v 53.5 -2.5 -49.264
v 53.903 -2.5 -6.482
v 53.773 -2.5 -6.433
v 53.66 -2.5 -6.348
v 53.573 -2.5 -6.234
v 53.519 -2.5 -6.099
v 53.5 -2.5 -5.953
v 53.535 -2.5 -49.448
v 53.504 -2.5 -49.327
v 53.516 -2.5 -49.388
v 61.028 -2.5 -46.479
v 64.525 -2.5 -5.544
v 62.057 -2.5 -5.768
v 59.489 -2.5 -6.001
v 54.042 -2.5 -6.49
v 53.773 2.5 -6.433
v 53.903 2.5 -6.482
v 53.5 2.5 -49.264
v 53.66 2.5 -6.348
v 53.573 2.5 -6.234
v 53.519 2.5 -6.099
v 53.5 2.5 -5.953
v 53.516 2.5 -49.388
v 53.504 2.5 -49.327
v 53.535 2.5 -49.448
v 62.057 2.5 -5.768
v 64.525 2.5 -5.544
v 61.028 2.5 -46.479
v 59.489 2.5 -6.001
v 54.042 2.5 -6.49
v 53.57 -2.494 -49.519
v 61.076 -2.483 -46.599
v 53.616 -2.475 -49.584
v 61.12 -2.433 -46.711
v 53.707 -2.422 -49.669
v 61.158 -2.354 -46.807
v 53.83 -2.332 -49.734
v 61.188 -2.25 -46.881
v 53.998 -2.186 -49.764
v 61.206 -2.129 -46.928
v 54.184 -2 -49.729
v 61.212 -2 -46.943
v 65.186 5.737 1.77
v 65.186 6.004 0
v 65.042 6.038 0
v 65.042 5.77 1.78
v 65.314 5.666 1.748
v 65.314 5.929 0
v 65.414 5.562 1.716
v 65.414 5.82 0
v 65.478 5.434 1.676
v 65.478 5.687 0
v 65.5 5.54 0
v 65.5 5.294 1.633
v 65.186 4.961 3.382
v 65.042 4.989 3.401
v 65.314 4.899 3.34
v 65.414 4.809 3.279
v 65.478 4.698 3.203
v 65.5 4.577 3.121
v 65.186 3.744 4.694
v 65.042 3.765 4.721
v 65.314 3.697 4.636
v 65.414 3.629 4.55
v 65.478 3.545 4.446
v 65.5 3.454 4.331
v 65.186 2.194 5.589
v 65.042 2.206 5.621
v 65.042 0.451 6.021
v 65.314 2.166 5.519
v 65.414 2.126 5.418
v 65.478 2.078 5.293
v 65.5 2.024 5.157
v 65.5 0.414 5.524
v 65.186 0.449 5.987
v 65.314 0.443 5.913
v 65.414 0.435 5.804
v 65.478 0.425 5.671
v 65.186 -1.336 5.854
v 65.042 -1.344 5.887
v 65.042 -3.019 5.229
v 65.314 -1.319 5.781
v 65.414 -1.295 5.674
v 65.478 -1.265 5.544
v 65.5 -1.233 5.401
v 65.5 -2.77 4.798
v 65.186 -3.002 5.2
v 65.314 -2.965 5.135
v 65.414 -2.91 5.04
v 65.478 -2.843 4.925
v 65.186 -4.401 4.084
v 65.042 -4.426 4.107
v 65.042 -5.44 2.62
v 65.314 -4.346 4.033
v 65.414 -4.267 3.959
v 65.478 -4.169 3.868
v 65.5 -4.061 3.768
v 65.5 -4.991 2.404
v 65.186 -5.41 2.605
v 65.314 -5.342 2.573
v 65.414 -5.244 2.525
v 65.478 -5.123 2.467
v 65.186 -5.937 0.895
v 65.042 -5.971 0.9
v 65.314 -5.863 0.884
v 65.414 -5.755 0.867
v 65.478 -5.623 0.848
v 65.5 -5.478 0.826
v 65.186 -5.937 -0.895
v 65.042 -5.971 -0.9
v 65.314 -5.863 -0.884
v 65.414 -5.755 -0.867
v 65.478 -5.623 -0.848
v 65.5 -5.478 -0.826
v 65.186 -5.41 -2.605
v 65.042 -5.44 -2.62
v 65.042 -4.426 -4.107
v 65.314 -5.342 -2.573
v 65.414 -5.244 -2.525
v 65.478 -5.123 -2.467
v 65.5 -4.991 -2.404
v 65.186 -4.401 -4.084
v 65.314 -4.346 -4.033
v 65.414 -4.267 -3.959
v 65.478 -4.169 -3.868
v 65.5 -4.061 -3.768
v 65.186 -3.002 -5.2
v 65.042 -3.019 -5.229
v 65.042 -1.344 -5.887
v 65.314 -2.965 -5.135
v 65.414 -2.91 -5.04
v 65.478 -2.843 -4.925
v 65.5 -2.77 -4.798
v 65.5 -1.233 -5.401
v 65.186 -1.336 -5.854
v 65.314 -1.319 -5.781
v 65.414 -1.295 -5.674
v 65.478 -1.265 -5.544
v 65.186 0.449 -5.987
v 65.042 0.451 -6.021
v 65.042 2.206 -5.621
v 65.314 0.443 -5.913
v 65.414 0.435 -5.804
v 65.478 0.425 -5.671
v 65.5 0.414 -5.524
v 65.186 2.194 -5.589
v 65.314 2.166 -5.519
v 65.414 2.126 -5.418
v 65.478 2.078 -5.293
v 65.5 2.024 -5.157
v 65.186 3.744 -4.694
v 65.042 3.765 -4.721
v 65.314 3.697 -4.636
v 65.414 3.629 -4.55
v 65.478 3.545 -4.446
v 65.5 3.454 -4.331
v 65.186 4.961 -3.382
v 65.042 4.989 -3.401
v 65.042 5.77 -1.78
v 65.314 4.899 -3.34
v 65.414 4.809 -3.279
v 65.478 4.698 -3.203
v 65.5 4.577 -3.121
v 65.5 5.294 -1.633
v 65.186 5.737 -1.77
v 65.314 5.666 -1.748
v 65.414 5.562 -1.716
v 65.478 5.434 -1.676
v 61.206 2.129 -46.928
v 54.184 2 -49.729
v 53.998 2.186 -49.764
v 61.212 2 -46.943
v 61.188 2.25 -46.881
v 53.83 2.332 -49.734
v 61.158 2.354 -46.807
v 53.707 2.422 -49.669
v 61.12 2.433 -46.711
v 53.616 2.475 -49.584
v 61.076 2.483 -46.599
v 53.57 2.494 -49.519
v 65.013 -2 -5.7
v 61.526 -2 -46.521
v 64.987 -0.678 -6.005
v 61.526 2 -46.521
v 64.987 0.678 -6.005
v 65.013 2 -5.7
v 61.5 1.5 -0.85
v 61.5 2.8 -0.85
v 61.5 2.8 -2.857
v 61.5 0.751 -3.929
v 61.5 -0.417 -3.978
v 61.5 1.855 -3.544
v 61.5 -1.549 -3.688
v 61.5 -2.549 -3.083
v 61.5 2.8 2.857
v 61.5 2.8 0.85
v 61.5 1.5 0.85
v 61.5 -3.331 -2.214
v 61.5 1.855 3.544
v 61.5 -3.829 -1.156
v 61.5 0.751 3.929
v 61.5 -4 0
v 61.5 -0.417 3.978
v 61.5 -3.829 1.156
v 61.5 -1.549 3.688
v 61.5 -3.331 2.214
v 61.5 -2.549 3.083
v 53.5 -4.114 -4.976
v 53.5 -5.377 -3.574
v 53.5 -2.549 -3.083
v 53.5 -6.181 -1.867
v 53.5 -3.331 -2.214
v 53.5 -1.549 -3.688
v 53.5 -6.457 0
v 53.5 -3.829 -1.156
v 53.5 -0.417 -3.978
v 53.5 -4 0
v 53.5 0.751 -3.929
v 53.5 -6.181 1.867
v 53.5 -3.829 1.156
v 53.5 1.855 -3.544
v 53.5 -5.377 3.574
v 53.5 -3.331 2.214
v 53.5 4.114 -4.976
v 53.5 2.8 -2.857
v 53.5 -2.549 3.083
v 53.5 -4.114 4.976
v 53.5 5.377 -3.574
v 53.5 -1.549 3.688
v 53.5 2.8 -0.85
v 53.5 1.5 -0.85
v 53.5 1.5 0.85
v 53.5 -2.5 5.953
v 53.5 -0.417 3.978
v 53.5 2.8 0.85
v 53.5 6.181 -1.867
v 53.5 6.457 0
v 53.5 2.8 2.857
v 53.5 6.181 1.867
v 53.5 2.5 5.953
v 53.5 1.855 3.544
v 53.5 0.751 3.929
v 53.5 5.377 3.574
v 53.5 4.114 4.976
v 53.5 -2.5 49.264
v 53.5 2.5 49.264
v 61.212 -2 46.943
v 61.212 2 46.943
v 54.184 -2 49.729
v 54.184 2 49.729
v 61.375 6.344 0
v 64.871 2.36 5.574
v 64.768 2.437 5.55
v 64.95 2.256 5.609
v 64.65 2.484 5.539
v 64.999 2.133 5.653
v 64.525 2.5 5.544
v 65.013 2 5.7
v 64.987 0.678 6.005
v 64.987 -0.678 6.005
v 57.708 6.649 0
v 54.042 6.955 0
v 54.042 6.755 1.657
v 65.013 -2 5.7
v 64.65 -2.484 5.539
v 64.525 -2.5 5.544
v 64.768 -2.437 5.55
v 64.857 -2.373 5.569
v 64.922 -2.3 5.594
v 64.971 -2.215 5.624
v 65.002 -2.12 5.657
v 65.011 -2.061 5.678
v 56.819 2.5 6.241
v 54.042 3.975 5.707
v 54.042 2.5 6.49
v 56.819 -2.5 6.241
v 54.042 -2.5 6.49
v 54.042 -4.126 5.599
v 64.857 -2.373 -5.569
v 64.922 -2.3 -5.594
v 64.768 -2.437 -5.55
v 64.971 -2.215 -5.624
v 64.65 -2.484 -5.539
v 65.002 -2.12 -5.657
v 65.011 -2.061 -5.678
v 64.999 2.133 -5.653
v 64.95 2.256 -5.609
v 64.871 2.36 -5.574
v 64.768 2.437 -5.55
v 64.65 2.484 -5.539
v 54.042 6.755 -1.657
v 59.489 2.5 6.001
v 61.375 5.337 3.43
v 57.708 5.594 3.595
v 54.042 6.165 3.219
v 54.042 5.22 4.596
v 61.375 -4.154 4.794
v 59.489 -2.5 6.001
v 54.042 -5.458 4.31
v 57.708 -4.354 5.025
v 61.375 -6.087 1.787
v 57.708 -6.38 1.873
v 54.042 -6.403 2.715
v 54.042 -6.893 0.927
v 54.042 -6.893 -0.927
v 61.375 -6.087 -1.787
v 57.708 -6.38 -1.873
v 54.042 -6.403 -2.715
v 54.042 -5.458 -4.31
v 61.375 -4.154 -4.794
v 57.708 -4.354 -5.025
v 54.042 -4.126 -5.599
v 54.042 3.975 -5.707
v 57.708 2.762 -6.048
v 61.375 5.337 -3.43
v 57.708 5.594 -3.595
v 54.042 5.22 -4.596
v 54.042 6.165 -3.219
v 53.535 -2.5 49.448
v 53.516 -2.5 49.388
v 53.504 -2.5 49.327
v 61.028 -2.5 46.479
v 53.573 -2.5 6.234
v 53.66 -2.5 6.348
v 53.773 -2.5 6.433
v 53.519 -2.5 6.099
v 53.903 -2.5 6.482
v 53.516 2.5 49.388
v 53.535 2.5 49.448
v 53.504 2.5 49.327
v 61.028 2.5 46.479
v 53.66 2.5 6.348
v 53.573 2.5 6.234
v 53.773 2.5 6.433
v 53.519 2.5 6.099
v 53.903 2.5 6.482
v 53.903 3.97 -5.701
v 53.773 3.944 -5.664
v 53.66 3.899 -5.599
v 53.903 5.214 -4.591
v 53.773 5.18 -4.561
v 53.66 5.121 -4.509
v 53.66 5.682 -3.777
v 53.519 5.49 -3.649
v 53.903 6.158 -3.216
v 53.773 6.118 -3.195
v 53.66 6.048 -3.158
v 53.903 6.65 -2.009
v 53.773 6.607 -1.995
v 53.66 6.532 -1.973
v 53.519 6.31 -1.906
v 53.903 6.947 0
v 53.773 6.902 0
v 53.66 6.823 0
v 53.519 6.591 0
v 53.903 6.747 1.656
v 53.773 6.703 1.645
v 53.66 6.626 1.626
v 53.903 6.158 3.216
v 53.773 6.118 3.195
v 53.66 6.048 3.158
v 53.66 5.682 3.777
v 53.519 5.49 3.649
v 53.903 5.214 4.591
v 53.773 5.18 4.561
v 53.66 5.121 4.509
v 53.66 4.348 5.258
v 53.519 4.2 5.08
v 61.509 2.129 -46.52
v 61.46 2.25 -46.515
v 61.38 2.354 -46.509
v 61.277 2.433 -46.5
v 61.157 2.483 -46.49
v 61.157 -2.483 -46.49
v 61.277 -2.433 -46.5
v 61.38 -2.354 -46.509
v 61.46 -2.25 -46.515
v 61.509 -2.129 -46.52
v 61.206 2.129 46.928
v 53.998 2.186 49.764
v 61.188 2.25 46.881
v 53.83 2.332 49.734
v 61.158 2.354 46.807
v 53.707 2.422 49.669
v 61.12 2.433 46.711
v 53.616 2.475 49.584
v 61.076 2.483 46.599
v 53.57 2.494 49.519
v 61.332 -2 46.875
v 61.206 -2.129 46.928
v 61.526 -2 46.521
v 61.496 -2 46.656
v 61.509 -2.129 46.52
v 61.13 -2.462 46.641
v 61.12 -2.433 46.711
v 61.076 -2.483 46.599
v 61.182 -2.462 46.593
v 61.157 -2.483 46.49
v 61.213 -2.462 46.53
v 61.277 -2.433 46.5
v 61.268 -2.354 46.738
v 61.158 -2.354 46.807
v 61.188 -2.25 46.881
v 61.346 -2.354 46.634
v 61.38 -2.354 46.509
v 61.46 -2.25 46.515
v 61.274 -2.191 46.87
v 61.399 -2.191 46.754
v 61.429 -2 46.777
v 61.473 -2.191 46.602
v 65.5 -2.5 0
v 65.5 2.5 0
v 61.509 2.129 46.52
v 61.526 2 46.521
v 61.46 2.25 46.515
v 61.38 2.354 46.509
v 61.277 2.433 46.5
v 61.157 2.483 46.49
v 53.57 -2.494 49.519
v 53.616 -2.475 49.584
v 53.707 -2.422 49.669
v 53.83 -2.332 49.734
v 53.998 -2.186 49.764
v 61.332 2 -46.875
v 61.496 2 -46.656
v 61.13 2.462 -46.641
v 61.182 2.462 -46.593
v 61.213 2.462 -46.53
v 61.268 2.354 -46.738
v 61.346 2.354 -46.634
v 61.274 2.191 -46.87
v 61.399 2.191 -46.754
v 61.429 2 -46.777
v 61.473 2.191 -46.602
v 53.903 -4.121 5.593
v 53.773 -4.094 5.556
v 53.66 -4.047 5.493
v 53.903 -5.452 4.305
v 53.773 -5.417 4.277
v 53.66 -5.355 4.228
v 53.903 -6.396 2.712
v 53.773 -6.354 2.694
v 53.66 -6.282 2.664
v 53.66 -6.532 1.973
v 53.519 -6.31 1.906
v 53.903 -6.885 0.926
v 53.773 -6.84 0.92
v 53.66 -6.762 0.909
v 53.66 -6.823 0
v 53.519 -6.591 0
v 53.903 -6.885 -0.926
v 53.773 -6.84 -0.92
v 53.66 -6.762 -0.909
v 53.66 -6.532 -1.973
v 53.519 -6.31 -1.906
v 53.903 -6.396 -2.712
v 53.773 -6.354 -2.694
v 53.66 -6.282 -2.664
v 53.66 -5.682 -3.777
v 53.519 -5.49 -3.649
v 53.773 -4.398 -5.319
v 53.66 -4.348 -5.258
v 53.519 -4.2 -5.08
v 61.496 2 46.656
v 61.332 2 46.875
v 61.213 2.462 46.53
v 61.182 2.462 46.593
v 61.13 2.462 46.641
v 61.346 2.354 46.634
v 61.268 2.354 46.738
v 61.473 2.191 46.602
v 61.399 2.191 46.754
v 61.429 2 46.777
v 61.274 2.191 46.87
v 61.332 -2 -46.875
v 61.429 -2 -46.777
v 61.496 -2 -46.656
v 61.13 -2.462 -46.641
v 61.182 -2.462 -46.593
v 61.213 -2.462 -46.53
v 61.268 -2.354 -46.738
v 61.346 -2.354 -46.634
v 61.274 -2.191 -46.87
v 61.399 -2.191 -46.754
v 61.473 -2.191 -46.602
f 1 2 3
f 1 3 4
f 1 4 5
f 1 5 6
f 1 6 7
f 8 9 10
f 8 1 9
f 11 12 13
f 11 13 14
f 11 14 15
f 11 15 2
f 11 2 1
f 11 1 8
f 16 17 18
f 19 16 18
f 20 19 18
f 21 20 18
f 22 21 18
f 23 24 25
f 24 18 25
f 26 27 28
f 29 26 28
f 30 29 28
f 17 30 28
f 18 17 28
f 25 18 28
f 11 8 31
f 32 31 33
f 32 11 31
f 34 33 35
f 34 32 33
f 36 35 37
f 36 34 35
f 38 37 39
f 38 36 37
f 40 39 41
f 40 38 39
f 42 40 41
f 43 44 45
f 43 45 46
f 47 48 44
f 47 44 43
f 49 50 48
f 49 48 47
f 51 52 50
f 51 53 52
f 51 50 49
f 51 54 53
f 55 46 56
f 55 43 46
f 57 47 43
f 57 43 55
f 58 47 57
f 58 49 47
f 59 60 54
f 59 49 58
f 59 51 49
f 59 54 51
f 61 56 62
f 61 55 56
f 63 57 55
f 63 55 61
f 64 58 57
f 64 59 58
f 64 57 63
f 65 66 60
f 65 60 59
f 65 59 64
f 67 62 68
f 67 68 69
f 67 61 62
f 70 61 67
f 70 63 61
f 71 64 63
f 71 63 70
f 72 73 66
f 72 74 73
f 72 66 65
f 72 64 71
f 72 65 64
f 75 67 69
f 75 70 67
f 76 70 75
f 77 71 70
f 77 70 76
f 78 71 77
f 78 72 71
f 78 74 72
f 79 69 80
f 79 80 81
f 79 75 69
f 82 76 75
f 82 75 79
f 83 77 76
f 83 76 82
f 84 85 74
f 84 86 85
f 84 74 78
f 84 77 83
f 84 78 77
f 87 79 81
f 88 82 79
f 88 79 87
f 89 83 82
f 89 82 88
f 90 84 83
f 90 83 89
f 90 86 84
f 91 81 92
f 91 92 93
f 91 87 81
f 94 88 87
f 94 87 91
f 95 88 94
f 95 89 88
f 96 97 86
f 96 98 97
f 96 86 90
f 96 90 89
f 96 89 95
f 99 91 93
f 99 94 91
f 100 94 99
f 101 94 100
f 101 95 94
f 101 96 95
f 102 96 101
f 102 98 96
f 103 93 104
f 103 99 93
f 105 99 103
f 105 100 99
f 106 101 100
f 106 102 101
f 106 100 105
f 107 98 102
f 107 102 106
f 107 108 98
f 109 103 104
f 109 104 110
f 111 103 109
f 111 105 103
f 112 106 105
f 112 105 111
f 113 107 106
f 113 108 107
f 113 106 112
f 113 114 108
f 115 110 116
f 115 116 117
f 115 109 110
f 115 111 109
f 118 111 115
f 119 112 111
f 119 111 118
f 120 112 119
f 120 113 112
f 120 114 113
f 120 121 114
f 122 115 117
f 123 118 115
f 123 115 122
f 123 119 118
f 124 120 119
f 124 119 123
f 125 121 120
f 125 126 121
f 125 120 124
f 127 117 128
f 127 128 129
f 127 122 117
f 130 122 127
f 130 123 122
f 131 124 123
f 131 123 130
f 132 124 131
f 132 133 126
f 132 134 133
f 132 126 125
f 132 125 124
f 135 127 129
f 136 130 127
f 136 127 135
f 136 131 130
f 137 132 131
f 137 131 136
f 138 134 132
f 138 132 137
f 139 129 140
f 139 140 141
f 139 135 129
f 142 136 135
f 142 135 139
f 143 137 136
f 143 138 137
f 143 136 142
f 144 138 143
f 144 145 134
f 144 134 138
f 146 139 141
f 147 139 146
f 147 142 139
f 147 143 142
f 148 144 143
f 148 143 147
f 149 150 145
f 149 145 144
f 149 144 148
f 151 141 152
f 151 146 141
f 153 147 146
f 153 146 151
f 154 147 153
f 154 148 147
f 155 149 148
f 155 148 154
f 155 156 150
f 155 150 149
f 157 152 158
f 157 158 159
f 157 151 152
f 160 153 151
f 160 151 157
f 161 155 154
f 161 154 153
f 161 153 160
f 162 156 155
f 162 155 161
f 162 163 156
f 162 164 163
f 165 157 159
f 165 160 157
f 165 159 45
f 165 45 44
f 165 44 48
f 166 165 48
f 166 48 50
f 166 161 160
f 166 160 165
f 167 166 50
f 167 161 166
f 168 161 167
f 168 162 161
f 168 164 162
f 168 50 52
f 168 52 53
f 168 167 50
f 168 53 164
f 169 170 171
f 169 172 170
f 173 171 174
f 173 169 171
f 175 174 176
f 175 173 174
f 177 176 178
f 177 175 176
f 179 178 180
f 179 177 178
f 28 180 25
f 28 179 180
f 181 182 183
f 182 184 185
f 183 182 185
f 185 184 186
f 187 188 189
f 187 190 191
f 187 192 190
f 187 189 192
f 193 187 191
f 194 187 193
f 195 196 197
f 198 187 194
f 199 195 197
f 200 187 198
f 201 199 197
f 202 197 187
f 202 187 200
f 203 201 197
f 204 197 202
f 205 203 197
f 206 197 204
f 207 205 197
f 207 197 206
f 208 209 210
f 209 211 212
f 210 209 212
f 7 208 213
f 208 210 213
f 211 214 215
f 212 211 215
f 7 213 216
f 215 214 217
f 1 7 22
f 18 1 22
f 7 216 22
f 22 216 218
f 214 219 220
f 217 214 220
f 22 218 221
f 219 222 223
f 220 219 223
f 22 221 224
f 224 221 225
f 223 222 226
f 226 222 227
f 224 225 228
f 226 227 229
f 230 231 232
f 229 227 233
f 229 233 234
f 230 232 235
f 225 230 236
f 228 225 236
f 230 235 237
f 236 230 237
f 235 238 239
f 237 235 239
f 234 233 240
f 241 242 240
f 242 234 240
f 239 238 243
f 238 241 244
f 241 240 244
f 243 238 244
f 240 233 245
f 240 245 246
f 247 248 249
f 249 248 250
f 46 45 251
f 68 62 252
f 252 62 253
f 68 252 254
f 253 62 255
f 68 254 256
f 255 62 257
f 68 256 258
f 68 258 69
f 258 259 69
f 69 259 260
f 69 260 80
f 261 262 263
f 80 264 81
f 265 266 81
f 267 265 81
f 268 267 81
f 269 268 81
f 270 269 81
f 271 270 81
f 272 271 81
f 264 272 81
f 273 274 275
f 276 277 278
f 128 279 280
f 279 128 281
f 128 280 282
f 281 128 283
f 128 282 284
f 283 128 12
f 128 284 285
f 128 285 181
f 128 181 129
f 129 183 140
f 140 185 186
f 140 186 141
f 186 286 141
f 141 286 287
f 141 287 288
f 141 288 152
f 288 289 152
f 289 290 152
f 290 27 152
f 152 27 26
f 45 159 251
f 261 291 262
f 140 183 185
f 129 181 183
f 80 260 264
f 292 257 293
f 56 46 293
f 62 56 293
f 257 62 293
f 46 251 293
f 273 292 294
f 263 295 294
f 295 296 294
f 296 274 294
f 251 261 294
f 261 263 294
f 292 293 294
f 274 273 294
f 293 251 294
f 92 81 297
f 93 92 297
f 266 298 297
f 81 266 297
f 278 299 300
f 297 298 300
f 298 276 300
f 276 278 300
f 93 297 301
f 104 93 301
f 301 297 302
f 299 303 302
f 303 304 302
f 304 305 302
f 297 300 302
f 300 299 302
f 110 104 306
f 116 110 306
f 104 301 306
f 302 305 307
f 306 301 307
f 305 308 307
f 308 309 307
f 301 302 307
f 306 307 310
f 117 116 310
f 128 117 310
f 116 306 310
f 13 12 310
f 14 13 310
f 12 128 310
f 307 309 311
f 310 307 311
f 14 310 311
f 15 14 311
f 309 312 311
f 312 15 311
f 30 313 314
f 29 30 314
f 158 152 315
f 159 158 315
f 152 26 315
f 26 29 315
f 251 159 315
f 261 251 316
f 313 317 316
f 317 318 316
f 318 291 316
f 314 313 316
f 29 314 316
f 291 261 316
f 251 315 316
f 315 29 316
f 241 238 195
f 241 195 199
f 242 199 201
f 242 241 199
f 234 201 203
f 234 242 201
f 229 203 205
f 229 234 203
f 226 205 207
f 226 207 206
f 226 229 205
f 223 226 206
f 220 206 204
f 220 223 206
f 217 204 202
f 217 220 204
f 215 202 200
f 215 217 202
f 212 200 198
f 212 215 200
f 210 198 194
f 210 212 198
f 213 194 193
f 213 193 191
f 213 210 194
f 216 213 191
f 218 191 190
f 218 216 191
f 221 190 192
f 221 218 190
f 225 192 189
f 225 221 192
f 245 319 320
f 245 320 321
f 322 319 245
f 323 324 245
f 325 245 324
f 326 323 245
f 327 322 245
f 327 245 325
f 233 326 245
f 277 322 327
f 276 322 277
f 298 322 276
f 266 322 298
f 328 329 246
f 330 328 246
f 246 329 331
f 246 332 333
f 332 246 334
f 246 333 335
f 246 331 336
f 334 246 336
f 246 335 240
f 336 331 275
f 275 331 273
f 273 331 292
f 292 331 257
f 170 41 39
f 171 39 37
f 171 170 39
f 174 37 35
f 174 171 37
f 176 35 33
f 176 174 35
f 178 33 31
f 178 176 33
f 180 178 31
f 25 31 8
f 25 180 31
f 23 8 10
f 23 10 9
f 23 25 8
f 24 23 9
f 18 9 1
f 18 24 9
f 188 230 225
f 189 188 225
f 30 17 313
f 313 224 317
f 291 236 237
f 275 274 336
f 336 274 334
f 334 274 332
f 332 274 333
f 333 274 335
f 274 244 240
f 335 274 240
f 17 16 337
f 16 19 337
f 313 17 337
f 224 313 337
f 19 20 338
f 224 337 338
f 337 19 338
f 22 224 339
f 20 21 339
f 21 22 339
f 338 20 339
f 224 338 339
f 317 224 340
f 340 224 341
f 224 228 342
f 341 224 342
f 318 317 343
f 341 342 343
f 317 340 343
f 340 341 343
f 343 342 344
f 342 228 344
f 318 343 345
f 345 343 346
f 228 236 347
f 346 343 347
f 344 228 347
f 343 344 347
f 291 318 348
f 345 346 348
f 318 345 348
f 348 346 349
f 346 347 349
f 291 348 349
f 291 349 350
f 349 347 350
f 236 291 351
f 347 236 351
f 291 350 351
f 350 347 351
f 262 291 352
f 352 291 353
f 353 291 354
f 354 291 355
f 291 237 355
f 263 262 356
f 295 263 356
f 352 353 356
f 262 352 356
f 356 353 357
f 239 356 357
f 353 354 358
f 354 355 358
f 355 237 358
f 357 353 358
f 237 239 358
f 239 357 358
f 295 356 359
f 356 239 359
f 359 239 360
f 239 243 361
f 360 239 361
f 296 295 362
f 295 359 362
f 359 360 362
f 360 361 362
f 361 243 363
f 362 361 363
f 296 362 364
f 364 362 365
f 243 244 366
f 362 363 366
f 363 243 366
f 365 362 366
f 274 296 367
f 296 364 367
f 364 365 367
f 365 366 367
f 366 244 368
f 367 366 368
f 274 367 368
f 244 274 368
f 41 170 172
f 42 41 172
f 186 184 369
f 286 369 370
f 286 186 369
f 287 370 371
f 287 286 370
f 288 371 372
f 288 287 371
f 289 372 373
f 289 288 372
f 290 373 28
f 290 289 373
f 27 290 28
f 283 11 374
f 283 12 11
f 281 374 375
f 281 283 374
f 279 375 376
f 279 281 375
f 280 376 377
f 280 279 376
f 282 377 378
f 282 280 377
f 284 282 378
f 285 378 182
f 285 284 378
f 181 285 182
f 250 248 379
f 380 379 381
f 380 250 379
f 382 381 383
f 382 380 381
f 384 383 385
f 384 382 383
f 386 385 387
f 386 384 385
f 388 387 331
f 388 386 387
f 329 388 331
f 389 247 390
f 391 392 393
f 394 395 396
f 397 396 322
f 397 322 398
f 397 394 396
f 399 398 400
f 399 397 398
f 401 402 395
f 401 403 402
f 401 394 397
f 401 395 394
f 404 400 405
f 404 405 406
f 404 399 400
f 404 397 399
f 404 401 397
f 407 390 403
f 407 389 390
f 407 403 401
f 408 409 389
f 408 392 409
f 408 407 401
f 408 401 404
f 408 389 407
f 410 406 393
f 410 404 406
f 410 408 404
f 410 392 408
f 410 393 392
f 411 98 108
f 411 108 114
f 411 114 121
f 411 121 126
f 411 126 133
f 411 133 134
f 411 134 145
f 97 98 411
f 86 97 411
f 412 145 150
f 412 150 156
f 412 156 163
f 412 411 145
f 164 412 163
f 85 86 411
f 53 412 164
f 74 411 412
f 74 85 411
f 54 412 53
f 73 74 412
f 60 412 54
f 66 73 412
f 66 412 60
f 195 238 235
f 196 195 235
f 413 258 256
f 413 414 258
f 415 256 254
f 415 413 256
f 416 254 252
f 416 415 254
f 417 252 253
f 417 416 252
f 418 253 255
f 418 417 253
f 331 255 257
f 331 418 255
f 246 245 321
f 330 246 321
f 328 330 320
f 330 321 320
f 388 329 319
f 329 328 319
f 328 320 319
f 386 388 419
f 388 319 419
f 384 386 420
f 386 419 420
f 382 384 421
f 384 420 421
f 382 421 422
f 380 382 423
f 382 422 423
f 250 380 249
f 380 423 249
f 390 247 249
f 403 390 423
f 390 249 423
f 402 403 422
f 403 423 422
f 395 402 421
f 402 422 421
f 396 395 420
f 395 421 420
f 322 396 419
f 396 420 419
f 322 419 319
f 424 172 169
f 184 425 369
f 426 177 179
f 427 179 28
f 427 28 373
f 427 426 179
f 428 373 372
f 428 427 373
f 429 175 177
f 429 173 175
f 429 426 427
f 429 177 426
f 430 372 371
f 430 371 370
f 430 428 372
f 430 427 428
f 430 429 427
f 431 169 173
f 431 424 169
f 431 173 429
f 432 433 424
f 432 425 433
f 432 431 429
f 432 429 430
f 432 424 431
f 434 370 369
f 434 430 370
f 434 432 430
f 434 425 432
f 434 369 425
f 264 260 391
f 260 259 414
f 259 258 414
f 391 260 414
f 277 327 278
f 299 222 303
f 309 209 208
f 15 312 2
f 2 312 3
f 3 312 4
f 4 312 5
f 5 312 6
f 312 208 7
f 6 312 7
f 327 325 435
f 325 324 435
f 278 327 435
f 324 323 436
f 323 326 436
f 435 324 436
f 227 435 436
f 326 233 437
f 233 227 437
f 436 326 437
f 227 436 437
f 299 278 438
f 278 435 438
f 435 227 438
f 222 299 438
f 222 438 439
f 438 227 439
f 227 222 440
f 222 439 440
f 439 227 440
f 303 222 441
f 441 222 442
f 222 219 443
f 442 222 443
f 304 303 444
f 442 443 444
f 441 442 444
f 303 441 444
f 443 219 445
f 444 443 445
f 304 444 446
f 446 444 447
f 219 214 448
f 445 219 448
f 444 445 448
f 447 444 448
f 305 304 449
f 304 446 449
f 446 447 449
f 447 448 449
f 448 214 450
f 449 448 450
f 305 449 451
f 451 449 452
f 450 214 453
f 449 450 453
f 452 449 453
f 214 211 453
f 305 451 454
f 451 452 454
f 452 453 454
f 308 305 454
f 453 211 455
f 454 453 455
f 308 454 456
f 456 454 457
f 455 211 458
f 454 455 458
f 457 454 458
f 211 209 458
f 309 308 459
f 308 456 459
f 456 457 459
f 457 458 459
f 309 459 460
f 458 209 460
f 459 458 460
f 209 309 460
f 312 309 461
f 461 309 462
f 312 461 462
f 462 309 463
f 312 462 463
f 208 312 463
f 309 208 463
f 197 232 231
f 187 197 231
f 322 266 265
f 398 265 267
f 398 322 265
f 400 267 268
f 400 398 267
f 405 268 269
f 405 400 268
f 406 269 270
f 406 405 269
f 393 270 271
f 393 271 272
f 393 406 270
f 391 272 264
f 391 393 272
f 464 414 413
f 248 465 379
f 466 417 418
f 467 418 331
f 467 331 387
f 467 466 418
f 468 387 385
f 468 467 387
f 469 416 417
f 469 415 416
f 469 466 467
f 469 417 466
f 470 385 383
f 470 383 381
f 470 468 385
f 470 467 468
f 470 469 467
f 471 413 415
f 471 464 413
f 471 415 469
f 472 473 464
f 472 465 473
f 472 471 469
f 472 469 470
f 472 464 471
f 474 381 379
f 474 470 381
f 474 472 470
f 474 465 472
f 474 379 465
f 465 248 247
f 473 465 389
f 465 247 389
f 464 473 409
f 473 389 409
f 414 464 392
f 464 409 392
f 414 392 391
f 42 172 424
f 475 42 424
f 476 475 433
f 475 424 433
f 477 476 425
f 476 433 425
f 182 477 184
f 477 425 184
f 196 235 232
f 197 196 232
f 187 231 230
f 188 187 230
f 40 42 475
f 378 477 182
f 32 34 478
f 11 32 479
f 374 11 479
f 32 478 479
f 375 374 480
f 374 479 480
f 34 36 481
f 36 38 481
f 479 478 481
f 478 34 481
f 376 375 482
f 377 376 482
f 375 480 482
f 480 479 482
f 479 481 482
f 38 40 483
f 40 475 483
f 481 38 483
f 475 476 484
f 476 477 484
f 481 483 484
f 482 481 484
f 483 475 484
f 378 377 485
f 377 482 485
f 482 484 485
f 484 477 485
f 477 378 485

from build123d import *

# Parameters (mm, degrees)
SKETCH028_R             = 6
SKETCH027_R             = 7
PAD010_DEPTH            = 2.5
FILLET002_R             = 0.5
FILLET003_R             = 0.5
FILLET004_R             = 0.5
POCKET009_DEPTH         = 8
BODY005_ROLL_ANGLE      = 90
BODY005_PLACEMENT_ANGLE = 90


with BuildPart() as part:
    # Sketch028 → AdditiveLoft section 0
    with BuildSketch(Plane.XY.offset(12)):
        Circle(SKETCH028_R)
    # Sketch027 → AdditiveLoft section 1
    with BuildSketch(Plane.XY):
        Circle(SKETCH027_R)
    loft()

    # Sketch029 → Pad010 (new body, symmetric)
    with BuildSketch(Plane.YZ):
        Polygon((0, 12), (46.829478, 8), (50, 0), (0, 0), (-50, 0), (-46.829478, 8), align=None)
    extrude(amount=PAD010_DEPTH, both=True)

    # Fillet002
    fillet002_edges = [part.edges().sort_by_distance(p)[0] for p in [
        (-6, 0, 12),
    ]]
    fillet(fillet002_edges, radius=FILLET002_R)

    # Fillet003
    fillet003_edges = [part.edges().sort_by_distance(p)[0] for p in [
        (-7, 0, 0),
        (5.766281, 3.968627, 0),
        (5.766281, -3.968627, 0),
    ]]
    fillet(fillet003_edges, radius=FILLET003_R)

    # Fillet004
    fillet004_edges = [part.edges().sort_by_distance(p)[0] for p in [
        (2.5, 26.163425, 9.765217),
        (-2.5, 26.163425, 9.765217),
        (-2.5, -26.163425, 9.765217),
        (2.5, -26.163425, 9.765217),
        (0, -46.829478, 8),
        (0, -50, 0),
        (-2.5, -48.414739, 4),
        (2.5, -48.414739, 4),
        (2.5, 48.414739, 4),
        (0, 46.829478, 8),
        (-2.5, 48.414739, 4),
        (0, 50, 0),
    ]]
    fillet(fillet004_edges, radius=FILLET004_R)

    # Sketch030 → Pocket009 (cut)
    with BuildSketch(Plane.XY):
        with BuildLine():
            Line((2.8, 2.856571), (2.8, 0.85))
            Line((2.8, 0.85), (1.5, 0.85))
            Line((1.5, 0.85), (1.5, -0.85))
            Line((1.5, -0.85), (2.8, -0.85))
            Line((2.8, -0.85), (2.8, -2.856571))
            ThreePointArc((2.8, 2.856571), (-4, 0), (2.8, -2.856571))
        make_face()
    extrude(amount=POCKET009_DEPTH, mode=Mode.SUBTRACT)


with BuildPart() as part_1:
    # Body005 roll: moved
    add(part.part.rotate(Axis((0, 0, 0), (1, 0, 0)), BODY005_ROLL_ANGLE))


with BuildPart() as part_2:
    # Body005 placement: moved
    add(part_1.part.moved(Location((53.5, 0, 0))).rotate(Axis((53.5, 0, 0), (0, 0, 1)), BODY005_PLACEMENT_ANGLE))


solid = part_2.part
